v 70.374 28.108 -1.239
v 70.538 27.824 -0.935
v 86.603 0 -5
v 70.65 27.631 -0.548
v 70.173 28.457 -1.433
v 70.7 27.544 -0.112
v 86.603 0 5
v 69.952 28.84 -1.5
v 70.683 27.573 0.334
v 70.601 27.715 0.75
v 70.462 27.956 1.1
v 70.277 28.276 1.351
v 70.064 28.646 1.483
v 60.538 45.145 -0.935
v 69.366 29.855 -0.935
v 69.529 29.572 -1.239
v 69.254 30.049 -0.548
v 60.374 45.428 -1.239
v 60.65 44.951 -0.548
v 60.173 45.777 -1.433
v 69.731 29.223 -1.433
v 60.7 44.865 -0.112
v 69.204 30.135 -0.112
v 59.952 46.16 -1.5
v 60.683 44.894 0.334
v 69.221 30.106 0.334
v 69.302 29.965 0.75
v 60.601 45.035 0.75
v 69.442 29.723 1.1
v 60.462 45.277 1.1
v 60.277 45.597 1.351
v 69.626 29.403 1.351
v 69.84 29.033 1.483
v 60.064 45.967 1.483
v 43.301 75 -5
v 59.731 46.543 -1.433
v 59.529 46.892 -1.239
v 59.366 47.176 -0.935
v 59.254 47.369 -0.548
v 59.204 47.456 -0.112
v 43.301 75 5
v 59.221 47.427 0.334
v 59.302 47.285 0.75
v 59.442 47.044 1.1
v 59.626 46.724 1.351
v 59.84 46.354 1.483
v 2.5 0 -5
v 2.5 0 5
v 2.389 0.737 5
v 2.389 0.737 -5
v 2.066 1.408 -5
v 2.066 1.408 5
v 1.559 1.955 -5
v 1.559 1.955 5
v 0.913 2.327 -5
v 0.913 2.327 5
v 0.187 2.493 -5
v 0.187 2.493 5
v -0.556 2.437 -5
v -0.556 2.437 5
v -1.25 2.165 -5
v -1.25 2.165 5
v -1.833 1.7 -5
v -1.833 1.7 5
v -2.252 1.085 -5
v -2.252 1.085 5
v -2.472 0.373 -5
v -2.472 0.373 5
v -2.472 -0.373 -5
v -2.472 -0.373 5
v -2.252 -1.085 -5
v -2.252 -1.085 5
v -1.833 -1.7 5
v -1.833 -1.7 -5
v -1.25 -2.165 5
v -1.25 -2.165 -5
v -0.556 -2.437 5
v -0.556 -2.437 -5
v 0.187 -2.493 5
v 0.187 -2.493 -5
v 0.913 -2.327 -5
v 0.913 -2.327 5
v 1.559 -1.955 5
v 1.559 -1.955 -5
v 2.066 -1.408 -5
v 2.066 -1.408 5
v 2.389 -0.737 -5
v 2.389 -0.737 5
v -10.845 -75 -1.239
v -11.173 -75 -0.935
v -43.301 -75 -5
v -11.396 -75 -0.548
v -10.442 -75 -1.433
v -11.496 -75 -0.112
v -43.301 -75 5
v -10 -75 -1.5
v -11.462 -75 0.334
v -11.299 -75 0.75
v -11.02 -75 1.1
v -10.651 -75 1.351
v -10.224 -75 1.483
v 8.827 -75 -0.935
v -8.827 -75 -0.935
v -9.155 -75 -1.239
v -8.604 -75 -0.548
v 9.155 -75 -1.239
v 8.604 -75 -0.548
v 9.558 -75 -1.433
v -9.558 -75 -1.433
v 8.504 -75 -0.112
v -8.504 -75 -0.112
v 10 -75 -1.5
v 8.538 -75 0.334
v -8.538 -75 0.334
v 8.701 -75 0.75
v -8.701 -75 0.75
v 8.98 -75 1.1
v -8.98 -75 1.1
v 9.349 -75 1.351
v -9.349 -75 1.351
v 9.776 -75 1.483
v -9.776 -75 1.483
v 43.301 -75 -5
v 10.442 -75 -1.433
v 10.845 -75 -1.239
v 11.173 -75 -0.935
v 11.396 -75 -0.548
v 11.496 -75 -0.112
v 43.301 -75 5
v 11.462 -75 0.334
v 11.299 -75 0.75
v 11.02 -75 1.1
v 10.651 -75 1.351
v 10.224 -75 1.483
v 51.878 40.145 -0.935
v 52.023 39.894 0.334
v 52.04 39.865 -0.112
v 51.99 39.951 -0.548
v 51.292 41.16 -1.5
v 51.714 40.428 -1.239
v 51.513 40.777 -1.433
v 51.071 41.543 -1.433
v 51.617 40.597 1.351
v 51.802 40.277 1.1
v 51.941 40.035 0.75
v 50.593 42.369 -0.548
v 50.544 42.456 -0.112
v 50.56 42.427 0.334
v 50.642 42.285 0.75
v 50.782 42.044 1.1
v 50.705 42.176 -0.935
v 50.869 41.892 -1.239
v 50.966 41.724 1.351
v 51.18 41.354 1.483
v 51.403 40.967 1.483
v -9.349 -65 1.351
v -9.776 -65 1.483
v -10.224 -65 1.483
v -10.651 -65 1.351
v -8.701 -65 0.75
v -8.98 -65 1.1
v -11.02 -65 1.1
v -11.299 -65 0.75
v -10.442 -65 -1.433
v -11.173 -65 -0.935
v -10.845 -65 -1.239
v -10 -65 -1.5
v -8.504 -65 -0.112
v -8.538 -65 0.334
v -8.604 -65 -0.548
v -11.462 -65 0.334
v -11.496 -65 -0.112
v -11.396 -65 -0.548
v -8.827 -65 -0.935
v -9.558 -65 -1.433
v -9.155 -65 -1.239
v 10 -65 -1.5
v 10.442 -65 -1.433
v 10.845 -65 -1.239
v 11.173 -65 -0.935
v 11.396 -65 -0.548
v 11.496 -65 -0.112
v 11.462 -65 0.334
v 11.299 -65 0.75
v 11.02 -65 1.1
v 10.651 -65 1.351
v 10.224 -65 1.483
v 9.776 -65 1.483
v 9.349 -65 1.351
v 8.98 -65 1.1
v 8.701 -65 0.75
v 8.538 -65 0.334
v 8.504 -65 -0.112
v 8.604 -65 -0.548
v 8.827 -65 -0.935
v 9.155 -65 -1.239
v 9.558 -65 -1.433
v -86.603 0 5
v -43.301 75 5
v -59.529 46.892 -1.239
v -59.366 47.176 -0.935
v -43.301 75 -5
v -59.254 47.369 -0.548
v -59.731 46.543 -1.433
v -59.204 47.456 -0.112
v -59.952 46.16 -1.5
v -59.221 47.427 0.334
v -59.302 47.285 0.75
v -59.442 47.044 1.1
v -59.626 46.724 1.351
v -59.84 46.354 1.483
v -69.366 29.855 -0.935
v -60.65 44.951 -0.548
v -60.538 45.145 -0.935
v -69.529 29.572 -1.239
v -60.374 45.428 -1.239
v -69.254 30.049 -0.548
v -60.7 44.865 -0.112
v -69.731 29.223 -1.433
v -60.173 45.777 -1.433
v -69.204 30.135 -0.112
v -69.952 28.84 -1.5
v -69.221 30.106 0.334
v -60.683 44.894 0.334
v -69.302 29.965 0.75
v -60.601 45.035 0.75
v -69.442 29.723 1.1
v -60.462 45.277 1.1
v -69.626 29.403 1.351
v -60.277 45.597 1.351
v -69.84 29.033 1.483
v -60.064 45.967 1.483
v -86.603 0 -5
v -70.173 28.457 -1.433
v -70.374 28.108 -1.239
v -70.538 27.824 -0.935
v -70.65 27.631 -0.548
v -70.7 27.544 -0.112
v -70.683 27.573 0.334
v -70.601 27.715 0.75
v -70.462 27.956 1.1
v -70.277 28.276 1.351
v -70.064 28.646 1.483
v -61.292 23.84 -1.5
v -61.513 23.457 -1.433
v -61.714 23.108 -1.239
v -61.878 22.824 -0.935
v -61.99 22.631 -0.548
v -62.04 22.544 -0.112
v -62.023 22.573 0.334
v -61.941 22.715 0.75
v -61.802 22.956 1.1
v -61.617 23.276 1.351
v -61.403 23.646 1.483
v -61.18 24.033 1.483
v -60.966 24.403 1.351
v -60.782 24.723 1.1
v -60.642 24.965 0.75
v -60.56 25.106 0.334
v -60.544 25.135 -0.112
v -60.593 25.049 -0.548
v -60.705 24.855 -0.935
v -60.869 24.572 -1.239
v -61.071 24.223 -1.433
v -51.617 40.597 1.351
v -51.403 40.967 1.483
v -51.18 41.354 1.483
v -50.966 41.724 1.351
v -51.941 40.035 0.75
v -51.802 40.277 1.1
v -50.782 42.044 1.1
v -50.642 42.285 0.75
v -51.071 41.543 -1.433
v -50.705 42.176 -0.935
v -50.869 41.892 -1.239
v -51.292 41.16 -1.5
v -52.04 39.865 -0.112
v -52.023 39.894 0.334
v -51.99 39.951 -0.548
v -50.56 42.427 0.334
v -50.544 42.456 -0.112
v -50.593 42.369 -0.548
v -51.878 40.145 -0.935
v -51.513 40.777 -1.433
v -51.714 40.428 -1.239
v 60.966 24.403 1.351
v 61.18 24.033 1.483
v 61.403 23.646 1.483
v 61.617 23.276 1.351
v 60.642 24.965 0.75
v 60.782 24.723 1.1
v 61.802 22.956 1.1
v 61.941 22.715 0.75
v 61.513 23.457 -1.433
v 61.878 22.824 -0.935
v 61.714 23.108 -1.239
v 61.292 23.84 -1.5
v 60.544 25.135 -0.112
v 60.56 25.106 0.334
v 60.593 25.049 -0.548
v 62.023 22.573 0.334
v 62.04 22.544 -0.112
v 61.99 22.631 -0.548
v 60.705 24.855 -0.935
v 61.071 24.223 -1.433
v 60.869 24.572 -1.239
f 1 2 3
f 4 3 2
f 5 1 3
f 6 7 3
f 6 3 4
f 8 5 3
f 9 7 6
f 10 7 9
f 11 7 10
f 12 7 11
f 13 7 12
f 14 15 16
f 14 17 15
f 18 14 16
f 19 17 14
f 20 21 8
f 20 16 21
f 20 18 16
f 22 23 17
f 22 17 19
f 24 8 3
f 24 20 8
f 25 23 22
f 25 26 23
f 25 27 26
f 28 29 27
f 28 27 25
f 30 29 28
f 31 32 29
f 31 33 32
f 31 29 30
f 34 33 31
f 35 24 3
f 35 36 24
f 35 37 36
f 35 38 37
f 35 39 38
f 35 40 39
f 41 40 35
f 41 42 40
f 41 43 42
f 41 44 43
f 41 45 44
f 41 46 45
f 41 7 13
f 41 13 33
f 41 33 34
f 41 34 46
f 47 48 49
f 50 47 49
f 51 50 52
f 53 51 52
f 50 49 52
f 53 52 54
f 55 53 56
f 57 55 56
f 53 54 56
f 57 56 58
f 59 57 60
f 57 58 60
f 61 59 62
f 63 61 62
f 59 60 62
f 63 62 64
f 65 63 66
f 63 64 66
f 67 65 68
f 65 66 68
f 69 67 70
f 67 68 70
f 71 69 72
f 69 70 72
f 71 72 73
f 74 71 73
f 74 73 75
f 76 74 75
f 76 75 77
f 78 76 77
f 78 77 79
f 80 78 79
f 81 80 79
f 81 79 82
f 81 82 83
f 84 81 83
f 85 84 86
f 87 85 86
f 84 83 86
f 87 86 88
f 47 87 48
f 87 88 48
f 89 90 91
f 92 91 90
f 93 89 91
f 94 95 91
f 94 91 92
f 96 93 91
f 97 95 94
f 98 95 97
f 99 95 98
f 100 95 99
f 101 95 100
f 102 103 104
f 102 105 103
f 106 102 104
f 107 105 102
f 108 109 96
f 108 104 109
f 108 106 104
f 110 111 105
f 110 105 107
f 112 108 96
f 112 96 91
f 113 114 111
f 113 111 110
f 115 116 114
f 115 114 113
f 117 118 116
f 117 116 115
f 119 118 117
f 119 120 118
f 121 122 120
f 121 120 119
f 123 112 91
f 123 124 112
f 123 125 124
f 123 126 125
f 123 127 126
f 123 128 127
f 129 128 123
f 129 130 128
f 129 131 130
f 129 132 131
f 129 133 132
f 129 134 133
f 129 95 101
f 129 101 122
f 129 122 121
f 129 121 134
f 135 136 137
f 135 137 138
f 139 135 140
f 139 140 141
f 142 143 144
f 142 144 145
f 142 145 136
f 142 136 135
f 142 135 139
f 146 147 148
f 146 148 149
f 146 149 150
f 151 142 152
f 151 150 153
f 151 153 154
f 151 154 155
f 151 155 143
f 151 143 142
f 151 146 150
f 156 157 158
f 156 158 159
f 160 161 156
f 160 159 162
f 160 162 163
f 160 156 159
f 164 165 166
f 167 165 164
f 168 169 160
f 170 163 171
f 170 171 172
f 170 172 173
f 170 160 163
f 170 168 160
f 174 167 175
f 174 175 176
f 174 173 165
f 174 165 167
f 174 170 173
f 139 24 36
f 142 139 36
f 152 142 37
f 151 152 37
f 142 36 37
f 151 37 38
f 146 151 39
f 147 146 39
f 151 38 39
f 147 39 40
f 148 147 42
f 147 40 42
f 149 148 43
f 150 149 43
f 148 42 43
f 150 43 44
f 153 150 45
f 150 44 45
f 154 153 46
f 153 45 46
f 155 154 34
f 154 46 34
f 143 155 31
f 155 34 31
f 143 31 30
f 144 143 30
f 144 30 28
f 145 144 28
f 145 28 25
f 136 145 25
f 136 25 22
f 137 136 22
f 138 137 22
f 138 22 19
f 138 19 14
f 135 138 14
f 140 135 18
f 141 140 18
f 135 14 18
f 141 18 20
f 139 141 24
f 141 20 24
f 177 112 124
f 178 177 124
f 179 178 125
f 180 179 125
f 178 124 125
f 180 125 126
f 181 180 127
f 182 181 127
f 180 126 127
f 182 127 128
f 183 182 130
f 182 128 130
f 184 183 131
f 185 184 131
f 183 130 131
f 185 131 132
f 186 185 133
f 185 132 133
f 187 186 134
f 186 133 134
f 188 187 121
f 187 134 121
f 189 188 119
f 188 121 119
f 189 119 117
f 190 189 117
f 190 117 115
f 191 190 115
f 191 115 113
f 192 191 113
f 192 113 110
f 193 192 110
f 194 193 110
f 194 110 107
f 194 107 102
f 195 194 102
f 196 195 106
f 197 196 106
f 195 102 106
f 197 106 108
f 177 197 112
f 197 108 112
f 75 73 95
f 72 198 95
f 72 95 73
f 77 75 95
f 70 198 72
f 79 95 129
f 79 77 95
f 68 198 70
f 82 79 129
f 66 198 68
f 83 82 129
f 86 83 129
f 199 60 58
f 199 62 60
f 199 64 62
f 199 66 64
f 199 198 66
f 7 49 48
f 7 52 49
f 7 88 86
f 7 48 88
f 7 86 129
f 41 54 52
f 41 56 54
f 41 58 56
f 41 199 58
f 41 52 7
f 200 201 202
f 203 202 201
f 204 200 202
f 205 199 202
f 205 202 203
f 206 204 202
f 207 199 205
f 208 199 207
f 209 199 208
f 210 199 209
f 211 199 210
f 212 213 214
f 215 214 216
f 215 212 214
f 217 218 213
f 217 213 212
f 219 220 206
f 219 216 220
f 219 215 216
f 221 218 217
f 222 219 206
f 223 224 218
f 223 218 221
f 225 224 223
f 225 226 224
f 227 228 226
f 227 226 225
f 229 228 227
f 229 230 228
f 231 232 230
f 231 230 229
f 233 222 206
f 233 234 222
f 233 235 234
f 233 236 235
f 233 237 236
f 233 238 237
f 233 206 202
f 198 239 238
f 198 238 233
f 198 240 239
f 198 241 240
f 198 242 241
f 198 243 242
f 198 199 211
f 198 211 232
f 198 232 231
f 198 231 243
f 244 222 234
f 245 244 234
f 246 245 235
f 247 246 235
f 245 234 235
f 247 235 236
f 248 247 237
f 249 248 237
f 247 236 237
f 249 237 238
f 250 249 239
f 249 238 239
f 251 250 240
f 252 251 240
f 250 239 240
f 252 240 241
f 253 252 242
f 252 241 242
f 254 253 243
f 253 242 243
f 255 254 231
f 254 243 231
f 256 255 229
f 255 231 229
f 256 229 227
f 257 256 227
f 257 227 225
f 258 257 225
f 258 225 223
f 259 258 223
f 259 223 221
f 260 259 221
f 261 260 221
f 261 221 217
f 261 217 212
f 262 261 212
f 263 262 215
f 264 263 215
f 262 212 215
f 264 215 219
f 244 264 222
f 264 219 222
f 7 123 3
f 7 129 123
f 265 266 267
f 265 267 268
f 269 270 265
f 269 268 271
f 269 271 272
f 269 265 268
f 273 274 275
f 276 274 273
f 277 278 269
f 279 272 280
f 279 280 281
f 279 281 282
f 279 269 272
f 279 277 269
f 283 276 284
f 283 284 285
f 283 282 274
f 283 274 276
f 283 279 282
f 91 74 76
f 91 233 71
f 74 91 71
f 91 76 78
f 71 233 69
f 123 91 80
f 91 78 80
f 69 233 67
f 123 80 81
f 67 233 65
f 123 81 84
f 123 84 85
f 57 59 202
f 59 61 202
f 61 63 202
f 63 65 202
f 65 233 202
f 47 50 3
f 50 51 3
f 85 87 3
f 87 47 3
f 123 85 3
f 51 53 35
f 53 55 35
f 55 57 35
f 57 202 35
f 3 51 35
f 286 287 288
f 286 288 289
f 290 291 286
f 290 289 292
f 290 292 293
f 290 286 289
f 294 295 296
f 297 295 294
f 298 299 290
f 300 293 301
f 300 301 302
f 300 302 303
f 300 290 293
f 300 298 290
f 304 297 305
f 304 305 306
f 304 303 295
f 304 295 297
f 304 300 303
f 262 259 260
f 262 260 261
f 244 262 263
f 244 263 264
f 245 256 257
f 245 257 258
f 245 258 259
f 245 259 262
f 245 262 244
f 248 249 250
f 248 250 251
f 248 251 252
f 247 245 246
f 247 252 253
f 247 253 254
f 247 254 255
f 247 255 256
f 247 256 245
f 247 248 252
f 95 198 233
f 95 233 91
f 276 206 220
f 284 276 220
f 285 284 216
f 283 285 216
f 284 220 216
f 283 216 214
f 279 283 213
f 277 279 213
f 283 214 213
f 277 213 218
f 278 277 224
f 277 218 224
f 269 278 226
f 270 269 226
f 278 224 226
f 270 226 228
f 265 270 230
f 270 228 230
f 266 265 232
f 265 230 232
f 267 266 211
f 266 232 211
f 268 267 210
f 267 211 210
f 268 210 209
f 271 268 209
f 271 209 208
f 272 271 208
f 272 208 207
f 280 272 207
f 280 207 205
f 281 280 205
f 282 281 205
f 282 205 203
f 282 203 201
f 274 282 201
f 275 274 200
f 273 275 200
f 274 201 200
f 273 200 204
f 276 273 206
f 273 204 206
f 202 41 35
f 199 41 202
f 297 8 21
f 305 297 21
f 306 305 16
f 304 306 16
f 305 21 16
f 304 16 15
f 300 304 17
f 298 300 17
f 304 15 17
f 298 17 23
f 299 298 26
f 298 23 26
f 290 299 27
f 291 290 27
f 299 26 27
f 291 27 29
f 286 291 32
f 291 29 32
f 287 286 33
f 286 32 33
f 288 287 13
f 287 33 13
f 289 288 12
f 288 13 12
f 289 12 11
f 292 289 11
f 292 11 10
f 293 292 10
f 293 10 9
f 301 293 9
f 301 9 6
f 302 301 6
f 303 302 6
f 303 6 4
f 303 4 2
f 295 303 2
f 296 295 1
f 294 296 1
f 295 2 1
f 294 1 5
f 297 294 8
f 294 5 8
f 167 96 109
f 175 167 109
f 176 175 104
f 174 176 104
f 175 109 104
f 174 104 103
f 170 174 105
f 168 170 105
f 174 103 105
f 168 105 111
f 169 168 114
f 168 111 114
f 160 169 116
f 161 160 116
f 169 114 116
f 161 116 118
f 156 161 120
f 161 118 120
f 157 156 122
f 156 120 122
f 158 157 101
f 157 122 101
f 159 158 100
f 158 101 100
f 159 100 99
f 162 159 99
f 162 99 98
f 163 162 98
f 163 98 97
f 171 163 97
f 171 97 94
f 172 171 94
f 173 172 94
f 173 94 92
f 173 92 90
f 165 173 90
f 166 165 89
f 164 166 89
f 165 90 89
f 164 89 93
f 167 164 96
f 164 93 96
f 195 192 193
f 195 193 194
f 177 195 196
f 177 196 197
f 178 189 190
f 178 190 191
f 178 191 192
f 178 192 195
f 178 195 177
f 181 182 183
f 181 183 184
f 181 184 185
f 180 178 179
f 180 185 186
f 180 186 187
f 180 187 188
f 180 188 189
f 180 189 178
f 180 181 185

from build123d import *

# Parameters (mm, degrees)
BOSS_EXTRUDE1_DEPTH = 5
SKETCH2_R           = 1.5
CUT_EXTRUDE1_DEPTH  = 10
SKETCH3_R           = 2.5
CUT_EXTRUDE2_DEPTH  = 10
CIRPATTERN1_COUNT   = 3


with BuildPart() as part:
    # Sketch1 → Boss-Extrude1 (new, symmetric)
    with BuildSketch(Plane.XY):
        Polygon((86.602540378, 0), (43.301270189, 75), (-43.301270189, 75), (-86.602540378, 0), (-43.301270189, -75), (43.301270189, -75), align=None)
    extrude(amount=BOSS_EXTRUDE1_DEPTH, both=True)

    # Sketch2 → Cut-Extrude1 (cut)
    with BuildSketch(Plane.XZ.offset(75)):
        with Locations(Location((-10, 0, 0), (0, 0, 270))):
            Circle(SKETCH2_R)
        with Locations(Location((10, 0, 0), (0, 0, 270))):
            Circle(SKETCH2_R)
    cut_extrude1 = extrude(amount=-CUT_EXTRUDE1_DEPTH, mode=Mode.SUBTRACT)

    # Sketch3 → Cut-Extrude2 (cut)
    with BuildSketch(Plane.XY.offset(5)):
        Circle(SKETCH3_R)
    extrude(amount=-CUT_EXTRUDE2_DEPTH, mode=Mode.SUBTRACT)

    # CirPattern1: Cut-Extrude1 ×3 about axis
    cirpattern1_axis = Axis((0, 0, 0), (0, 0, 1))
    for i in range(1, CIRPATTERN1_COUNT):
        add(cut_extrude1.rotate(cirpattern1_axis, i * 360 / CIRPATTERN1_COUNT), mode=Mode.SUBTRACT)


solid = part.part
